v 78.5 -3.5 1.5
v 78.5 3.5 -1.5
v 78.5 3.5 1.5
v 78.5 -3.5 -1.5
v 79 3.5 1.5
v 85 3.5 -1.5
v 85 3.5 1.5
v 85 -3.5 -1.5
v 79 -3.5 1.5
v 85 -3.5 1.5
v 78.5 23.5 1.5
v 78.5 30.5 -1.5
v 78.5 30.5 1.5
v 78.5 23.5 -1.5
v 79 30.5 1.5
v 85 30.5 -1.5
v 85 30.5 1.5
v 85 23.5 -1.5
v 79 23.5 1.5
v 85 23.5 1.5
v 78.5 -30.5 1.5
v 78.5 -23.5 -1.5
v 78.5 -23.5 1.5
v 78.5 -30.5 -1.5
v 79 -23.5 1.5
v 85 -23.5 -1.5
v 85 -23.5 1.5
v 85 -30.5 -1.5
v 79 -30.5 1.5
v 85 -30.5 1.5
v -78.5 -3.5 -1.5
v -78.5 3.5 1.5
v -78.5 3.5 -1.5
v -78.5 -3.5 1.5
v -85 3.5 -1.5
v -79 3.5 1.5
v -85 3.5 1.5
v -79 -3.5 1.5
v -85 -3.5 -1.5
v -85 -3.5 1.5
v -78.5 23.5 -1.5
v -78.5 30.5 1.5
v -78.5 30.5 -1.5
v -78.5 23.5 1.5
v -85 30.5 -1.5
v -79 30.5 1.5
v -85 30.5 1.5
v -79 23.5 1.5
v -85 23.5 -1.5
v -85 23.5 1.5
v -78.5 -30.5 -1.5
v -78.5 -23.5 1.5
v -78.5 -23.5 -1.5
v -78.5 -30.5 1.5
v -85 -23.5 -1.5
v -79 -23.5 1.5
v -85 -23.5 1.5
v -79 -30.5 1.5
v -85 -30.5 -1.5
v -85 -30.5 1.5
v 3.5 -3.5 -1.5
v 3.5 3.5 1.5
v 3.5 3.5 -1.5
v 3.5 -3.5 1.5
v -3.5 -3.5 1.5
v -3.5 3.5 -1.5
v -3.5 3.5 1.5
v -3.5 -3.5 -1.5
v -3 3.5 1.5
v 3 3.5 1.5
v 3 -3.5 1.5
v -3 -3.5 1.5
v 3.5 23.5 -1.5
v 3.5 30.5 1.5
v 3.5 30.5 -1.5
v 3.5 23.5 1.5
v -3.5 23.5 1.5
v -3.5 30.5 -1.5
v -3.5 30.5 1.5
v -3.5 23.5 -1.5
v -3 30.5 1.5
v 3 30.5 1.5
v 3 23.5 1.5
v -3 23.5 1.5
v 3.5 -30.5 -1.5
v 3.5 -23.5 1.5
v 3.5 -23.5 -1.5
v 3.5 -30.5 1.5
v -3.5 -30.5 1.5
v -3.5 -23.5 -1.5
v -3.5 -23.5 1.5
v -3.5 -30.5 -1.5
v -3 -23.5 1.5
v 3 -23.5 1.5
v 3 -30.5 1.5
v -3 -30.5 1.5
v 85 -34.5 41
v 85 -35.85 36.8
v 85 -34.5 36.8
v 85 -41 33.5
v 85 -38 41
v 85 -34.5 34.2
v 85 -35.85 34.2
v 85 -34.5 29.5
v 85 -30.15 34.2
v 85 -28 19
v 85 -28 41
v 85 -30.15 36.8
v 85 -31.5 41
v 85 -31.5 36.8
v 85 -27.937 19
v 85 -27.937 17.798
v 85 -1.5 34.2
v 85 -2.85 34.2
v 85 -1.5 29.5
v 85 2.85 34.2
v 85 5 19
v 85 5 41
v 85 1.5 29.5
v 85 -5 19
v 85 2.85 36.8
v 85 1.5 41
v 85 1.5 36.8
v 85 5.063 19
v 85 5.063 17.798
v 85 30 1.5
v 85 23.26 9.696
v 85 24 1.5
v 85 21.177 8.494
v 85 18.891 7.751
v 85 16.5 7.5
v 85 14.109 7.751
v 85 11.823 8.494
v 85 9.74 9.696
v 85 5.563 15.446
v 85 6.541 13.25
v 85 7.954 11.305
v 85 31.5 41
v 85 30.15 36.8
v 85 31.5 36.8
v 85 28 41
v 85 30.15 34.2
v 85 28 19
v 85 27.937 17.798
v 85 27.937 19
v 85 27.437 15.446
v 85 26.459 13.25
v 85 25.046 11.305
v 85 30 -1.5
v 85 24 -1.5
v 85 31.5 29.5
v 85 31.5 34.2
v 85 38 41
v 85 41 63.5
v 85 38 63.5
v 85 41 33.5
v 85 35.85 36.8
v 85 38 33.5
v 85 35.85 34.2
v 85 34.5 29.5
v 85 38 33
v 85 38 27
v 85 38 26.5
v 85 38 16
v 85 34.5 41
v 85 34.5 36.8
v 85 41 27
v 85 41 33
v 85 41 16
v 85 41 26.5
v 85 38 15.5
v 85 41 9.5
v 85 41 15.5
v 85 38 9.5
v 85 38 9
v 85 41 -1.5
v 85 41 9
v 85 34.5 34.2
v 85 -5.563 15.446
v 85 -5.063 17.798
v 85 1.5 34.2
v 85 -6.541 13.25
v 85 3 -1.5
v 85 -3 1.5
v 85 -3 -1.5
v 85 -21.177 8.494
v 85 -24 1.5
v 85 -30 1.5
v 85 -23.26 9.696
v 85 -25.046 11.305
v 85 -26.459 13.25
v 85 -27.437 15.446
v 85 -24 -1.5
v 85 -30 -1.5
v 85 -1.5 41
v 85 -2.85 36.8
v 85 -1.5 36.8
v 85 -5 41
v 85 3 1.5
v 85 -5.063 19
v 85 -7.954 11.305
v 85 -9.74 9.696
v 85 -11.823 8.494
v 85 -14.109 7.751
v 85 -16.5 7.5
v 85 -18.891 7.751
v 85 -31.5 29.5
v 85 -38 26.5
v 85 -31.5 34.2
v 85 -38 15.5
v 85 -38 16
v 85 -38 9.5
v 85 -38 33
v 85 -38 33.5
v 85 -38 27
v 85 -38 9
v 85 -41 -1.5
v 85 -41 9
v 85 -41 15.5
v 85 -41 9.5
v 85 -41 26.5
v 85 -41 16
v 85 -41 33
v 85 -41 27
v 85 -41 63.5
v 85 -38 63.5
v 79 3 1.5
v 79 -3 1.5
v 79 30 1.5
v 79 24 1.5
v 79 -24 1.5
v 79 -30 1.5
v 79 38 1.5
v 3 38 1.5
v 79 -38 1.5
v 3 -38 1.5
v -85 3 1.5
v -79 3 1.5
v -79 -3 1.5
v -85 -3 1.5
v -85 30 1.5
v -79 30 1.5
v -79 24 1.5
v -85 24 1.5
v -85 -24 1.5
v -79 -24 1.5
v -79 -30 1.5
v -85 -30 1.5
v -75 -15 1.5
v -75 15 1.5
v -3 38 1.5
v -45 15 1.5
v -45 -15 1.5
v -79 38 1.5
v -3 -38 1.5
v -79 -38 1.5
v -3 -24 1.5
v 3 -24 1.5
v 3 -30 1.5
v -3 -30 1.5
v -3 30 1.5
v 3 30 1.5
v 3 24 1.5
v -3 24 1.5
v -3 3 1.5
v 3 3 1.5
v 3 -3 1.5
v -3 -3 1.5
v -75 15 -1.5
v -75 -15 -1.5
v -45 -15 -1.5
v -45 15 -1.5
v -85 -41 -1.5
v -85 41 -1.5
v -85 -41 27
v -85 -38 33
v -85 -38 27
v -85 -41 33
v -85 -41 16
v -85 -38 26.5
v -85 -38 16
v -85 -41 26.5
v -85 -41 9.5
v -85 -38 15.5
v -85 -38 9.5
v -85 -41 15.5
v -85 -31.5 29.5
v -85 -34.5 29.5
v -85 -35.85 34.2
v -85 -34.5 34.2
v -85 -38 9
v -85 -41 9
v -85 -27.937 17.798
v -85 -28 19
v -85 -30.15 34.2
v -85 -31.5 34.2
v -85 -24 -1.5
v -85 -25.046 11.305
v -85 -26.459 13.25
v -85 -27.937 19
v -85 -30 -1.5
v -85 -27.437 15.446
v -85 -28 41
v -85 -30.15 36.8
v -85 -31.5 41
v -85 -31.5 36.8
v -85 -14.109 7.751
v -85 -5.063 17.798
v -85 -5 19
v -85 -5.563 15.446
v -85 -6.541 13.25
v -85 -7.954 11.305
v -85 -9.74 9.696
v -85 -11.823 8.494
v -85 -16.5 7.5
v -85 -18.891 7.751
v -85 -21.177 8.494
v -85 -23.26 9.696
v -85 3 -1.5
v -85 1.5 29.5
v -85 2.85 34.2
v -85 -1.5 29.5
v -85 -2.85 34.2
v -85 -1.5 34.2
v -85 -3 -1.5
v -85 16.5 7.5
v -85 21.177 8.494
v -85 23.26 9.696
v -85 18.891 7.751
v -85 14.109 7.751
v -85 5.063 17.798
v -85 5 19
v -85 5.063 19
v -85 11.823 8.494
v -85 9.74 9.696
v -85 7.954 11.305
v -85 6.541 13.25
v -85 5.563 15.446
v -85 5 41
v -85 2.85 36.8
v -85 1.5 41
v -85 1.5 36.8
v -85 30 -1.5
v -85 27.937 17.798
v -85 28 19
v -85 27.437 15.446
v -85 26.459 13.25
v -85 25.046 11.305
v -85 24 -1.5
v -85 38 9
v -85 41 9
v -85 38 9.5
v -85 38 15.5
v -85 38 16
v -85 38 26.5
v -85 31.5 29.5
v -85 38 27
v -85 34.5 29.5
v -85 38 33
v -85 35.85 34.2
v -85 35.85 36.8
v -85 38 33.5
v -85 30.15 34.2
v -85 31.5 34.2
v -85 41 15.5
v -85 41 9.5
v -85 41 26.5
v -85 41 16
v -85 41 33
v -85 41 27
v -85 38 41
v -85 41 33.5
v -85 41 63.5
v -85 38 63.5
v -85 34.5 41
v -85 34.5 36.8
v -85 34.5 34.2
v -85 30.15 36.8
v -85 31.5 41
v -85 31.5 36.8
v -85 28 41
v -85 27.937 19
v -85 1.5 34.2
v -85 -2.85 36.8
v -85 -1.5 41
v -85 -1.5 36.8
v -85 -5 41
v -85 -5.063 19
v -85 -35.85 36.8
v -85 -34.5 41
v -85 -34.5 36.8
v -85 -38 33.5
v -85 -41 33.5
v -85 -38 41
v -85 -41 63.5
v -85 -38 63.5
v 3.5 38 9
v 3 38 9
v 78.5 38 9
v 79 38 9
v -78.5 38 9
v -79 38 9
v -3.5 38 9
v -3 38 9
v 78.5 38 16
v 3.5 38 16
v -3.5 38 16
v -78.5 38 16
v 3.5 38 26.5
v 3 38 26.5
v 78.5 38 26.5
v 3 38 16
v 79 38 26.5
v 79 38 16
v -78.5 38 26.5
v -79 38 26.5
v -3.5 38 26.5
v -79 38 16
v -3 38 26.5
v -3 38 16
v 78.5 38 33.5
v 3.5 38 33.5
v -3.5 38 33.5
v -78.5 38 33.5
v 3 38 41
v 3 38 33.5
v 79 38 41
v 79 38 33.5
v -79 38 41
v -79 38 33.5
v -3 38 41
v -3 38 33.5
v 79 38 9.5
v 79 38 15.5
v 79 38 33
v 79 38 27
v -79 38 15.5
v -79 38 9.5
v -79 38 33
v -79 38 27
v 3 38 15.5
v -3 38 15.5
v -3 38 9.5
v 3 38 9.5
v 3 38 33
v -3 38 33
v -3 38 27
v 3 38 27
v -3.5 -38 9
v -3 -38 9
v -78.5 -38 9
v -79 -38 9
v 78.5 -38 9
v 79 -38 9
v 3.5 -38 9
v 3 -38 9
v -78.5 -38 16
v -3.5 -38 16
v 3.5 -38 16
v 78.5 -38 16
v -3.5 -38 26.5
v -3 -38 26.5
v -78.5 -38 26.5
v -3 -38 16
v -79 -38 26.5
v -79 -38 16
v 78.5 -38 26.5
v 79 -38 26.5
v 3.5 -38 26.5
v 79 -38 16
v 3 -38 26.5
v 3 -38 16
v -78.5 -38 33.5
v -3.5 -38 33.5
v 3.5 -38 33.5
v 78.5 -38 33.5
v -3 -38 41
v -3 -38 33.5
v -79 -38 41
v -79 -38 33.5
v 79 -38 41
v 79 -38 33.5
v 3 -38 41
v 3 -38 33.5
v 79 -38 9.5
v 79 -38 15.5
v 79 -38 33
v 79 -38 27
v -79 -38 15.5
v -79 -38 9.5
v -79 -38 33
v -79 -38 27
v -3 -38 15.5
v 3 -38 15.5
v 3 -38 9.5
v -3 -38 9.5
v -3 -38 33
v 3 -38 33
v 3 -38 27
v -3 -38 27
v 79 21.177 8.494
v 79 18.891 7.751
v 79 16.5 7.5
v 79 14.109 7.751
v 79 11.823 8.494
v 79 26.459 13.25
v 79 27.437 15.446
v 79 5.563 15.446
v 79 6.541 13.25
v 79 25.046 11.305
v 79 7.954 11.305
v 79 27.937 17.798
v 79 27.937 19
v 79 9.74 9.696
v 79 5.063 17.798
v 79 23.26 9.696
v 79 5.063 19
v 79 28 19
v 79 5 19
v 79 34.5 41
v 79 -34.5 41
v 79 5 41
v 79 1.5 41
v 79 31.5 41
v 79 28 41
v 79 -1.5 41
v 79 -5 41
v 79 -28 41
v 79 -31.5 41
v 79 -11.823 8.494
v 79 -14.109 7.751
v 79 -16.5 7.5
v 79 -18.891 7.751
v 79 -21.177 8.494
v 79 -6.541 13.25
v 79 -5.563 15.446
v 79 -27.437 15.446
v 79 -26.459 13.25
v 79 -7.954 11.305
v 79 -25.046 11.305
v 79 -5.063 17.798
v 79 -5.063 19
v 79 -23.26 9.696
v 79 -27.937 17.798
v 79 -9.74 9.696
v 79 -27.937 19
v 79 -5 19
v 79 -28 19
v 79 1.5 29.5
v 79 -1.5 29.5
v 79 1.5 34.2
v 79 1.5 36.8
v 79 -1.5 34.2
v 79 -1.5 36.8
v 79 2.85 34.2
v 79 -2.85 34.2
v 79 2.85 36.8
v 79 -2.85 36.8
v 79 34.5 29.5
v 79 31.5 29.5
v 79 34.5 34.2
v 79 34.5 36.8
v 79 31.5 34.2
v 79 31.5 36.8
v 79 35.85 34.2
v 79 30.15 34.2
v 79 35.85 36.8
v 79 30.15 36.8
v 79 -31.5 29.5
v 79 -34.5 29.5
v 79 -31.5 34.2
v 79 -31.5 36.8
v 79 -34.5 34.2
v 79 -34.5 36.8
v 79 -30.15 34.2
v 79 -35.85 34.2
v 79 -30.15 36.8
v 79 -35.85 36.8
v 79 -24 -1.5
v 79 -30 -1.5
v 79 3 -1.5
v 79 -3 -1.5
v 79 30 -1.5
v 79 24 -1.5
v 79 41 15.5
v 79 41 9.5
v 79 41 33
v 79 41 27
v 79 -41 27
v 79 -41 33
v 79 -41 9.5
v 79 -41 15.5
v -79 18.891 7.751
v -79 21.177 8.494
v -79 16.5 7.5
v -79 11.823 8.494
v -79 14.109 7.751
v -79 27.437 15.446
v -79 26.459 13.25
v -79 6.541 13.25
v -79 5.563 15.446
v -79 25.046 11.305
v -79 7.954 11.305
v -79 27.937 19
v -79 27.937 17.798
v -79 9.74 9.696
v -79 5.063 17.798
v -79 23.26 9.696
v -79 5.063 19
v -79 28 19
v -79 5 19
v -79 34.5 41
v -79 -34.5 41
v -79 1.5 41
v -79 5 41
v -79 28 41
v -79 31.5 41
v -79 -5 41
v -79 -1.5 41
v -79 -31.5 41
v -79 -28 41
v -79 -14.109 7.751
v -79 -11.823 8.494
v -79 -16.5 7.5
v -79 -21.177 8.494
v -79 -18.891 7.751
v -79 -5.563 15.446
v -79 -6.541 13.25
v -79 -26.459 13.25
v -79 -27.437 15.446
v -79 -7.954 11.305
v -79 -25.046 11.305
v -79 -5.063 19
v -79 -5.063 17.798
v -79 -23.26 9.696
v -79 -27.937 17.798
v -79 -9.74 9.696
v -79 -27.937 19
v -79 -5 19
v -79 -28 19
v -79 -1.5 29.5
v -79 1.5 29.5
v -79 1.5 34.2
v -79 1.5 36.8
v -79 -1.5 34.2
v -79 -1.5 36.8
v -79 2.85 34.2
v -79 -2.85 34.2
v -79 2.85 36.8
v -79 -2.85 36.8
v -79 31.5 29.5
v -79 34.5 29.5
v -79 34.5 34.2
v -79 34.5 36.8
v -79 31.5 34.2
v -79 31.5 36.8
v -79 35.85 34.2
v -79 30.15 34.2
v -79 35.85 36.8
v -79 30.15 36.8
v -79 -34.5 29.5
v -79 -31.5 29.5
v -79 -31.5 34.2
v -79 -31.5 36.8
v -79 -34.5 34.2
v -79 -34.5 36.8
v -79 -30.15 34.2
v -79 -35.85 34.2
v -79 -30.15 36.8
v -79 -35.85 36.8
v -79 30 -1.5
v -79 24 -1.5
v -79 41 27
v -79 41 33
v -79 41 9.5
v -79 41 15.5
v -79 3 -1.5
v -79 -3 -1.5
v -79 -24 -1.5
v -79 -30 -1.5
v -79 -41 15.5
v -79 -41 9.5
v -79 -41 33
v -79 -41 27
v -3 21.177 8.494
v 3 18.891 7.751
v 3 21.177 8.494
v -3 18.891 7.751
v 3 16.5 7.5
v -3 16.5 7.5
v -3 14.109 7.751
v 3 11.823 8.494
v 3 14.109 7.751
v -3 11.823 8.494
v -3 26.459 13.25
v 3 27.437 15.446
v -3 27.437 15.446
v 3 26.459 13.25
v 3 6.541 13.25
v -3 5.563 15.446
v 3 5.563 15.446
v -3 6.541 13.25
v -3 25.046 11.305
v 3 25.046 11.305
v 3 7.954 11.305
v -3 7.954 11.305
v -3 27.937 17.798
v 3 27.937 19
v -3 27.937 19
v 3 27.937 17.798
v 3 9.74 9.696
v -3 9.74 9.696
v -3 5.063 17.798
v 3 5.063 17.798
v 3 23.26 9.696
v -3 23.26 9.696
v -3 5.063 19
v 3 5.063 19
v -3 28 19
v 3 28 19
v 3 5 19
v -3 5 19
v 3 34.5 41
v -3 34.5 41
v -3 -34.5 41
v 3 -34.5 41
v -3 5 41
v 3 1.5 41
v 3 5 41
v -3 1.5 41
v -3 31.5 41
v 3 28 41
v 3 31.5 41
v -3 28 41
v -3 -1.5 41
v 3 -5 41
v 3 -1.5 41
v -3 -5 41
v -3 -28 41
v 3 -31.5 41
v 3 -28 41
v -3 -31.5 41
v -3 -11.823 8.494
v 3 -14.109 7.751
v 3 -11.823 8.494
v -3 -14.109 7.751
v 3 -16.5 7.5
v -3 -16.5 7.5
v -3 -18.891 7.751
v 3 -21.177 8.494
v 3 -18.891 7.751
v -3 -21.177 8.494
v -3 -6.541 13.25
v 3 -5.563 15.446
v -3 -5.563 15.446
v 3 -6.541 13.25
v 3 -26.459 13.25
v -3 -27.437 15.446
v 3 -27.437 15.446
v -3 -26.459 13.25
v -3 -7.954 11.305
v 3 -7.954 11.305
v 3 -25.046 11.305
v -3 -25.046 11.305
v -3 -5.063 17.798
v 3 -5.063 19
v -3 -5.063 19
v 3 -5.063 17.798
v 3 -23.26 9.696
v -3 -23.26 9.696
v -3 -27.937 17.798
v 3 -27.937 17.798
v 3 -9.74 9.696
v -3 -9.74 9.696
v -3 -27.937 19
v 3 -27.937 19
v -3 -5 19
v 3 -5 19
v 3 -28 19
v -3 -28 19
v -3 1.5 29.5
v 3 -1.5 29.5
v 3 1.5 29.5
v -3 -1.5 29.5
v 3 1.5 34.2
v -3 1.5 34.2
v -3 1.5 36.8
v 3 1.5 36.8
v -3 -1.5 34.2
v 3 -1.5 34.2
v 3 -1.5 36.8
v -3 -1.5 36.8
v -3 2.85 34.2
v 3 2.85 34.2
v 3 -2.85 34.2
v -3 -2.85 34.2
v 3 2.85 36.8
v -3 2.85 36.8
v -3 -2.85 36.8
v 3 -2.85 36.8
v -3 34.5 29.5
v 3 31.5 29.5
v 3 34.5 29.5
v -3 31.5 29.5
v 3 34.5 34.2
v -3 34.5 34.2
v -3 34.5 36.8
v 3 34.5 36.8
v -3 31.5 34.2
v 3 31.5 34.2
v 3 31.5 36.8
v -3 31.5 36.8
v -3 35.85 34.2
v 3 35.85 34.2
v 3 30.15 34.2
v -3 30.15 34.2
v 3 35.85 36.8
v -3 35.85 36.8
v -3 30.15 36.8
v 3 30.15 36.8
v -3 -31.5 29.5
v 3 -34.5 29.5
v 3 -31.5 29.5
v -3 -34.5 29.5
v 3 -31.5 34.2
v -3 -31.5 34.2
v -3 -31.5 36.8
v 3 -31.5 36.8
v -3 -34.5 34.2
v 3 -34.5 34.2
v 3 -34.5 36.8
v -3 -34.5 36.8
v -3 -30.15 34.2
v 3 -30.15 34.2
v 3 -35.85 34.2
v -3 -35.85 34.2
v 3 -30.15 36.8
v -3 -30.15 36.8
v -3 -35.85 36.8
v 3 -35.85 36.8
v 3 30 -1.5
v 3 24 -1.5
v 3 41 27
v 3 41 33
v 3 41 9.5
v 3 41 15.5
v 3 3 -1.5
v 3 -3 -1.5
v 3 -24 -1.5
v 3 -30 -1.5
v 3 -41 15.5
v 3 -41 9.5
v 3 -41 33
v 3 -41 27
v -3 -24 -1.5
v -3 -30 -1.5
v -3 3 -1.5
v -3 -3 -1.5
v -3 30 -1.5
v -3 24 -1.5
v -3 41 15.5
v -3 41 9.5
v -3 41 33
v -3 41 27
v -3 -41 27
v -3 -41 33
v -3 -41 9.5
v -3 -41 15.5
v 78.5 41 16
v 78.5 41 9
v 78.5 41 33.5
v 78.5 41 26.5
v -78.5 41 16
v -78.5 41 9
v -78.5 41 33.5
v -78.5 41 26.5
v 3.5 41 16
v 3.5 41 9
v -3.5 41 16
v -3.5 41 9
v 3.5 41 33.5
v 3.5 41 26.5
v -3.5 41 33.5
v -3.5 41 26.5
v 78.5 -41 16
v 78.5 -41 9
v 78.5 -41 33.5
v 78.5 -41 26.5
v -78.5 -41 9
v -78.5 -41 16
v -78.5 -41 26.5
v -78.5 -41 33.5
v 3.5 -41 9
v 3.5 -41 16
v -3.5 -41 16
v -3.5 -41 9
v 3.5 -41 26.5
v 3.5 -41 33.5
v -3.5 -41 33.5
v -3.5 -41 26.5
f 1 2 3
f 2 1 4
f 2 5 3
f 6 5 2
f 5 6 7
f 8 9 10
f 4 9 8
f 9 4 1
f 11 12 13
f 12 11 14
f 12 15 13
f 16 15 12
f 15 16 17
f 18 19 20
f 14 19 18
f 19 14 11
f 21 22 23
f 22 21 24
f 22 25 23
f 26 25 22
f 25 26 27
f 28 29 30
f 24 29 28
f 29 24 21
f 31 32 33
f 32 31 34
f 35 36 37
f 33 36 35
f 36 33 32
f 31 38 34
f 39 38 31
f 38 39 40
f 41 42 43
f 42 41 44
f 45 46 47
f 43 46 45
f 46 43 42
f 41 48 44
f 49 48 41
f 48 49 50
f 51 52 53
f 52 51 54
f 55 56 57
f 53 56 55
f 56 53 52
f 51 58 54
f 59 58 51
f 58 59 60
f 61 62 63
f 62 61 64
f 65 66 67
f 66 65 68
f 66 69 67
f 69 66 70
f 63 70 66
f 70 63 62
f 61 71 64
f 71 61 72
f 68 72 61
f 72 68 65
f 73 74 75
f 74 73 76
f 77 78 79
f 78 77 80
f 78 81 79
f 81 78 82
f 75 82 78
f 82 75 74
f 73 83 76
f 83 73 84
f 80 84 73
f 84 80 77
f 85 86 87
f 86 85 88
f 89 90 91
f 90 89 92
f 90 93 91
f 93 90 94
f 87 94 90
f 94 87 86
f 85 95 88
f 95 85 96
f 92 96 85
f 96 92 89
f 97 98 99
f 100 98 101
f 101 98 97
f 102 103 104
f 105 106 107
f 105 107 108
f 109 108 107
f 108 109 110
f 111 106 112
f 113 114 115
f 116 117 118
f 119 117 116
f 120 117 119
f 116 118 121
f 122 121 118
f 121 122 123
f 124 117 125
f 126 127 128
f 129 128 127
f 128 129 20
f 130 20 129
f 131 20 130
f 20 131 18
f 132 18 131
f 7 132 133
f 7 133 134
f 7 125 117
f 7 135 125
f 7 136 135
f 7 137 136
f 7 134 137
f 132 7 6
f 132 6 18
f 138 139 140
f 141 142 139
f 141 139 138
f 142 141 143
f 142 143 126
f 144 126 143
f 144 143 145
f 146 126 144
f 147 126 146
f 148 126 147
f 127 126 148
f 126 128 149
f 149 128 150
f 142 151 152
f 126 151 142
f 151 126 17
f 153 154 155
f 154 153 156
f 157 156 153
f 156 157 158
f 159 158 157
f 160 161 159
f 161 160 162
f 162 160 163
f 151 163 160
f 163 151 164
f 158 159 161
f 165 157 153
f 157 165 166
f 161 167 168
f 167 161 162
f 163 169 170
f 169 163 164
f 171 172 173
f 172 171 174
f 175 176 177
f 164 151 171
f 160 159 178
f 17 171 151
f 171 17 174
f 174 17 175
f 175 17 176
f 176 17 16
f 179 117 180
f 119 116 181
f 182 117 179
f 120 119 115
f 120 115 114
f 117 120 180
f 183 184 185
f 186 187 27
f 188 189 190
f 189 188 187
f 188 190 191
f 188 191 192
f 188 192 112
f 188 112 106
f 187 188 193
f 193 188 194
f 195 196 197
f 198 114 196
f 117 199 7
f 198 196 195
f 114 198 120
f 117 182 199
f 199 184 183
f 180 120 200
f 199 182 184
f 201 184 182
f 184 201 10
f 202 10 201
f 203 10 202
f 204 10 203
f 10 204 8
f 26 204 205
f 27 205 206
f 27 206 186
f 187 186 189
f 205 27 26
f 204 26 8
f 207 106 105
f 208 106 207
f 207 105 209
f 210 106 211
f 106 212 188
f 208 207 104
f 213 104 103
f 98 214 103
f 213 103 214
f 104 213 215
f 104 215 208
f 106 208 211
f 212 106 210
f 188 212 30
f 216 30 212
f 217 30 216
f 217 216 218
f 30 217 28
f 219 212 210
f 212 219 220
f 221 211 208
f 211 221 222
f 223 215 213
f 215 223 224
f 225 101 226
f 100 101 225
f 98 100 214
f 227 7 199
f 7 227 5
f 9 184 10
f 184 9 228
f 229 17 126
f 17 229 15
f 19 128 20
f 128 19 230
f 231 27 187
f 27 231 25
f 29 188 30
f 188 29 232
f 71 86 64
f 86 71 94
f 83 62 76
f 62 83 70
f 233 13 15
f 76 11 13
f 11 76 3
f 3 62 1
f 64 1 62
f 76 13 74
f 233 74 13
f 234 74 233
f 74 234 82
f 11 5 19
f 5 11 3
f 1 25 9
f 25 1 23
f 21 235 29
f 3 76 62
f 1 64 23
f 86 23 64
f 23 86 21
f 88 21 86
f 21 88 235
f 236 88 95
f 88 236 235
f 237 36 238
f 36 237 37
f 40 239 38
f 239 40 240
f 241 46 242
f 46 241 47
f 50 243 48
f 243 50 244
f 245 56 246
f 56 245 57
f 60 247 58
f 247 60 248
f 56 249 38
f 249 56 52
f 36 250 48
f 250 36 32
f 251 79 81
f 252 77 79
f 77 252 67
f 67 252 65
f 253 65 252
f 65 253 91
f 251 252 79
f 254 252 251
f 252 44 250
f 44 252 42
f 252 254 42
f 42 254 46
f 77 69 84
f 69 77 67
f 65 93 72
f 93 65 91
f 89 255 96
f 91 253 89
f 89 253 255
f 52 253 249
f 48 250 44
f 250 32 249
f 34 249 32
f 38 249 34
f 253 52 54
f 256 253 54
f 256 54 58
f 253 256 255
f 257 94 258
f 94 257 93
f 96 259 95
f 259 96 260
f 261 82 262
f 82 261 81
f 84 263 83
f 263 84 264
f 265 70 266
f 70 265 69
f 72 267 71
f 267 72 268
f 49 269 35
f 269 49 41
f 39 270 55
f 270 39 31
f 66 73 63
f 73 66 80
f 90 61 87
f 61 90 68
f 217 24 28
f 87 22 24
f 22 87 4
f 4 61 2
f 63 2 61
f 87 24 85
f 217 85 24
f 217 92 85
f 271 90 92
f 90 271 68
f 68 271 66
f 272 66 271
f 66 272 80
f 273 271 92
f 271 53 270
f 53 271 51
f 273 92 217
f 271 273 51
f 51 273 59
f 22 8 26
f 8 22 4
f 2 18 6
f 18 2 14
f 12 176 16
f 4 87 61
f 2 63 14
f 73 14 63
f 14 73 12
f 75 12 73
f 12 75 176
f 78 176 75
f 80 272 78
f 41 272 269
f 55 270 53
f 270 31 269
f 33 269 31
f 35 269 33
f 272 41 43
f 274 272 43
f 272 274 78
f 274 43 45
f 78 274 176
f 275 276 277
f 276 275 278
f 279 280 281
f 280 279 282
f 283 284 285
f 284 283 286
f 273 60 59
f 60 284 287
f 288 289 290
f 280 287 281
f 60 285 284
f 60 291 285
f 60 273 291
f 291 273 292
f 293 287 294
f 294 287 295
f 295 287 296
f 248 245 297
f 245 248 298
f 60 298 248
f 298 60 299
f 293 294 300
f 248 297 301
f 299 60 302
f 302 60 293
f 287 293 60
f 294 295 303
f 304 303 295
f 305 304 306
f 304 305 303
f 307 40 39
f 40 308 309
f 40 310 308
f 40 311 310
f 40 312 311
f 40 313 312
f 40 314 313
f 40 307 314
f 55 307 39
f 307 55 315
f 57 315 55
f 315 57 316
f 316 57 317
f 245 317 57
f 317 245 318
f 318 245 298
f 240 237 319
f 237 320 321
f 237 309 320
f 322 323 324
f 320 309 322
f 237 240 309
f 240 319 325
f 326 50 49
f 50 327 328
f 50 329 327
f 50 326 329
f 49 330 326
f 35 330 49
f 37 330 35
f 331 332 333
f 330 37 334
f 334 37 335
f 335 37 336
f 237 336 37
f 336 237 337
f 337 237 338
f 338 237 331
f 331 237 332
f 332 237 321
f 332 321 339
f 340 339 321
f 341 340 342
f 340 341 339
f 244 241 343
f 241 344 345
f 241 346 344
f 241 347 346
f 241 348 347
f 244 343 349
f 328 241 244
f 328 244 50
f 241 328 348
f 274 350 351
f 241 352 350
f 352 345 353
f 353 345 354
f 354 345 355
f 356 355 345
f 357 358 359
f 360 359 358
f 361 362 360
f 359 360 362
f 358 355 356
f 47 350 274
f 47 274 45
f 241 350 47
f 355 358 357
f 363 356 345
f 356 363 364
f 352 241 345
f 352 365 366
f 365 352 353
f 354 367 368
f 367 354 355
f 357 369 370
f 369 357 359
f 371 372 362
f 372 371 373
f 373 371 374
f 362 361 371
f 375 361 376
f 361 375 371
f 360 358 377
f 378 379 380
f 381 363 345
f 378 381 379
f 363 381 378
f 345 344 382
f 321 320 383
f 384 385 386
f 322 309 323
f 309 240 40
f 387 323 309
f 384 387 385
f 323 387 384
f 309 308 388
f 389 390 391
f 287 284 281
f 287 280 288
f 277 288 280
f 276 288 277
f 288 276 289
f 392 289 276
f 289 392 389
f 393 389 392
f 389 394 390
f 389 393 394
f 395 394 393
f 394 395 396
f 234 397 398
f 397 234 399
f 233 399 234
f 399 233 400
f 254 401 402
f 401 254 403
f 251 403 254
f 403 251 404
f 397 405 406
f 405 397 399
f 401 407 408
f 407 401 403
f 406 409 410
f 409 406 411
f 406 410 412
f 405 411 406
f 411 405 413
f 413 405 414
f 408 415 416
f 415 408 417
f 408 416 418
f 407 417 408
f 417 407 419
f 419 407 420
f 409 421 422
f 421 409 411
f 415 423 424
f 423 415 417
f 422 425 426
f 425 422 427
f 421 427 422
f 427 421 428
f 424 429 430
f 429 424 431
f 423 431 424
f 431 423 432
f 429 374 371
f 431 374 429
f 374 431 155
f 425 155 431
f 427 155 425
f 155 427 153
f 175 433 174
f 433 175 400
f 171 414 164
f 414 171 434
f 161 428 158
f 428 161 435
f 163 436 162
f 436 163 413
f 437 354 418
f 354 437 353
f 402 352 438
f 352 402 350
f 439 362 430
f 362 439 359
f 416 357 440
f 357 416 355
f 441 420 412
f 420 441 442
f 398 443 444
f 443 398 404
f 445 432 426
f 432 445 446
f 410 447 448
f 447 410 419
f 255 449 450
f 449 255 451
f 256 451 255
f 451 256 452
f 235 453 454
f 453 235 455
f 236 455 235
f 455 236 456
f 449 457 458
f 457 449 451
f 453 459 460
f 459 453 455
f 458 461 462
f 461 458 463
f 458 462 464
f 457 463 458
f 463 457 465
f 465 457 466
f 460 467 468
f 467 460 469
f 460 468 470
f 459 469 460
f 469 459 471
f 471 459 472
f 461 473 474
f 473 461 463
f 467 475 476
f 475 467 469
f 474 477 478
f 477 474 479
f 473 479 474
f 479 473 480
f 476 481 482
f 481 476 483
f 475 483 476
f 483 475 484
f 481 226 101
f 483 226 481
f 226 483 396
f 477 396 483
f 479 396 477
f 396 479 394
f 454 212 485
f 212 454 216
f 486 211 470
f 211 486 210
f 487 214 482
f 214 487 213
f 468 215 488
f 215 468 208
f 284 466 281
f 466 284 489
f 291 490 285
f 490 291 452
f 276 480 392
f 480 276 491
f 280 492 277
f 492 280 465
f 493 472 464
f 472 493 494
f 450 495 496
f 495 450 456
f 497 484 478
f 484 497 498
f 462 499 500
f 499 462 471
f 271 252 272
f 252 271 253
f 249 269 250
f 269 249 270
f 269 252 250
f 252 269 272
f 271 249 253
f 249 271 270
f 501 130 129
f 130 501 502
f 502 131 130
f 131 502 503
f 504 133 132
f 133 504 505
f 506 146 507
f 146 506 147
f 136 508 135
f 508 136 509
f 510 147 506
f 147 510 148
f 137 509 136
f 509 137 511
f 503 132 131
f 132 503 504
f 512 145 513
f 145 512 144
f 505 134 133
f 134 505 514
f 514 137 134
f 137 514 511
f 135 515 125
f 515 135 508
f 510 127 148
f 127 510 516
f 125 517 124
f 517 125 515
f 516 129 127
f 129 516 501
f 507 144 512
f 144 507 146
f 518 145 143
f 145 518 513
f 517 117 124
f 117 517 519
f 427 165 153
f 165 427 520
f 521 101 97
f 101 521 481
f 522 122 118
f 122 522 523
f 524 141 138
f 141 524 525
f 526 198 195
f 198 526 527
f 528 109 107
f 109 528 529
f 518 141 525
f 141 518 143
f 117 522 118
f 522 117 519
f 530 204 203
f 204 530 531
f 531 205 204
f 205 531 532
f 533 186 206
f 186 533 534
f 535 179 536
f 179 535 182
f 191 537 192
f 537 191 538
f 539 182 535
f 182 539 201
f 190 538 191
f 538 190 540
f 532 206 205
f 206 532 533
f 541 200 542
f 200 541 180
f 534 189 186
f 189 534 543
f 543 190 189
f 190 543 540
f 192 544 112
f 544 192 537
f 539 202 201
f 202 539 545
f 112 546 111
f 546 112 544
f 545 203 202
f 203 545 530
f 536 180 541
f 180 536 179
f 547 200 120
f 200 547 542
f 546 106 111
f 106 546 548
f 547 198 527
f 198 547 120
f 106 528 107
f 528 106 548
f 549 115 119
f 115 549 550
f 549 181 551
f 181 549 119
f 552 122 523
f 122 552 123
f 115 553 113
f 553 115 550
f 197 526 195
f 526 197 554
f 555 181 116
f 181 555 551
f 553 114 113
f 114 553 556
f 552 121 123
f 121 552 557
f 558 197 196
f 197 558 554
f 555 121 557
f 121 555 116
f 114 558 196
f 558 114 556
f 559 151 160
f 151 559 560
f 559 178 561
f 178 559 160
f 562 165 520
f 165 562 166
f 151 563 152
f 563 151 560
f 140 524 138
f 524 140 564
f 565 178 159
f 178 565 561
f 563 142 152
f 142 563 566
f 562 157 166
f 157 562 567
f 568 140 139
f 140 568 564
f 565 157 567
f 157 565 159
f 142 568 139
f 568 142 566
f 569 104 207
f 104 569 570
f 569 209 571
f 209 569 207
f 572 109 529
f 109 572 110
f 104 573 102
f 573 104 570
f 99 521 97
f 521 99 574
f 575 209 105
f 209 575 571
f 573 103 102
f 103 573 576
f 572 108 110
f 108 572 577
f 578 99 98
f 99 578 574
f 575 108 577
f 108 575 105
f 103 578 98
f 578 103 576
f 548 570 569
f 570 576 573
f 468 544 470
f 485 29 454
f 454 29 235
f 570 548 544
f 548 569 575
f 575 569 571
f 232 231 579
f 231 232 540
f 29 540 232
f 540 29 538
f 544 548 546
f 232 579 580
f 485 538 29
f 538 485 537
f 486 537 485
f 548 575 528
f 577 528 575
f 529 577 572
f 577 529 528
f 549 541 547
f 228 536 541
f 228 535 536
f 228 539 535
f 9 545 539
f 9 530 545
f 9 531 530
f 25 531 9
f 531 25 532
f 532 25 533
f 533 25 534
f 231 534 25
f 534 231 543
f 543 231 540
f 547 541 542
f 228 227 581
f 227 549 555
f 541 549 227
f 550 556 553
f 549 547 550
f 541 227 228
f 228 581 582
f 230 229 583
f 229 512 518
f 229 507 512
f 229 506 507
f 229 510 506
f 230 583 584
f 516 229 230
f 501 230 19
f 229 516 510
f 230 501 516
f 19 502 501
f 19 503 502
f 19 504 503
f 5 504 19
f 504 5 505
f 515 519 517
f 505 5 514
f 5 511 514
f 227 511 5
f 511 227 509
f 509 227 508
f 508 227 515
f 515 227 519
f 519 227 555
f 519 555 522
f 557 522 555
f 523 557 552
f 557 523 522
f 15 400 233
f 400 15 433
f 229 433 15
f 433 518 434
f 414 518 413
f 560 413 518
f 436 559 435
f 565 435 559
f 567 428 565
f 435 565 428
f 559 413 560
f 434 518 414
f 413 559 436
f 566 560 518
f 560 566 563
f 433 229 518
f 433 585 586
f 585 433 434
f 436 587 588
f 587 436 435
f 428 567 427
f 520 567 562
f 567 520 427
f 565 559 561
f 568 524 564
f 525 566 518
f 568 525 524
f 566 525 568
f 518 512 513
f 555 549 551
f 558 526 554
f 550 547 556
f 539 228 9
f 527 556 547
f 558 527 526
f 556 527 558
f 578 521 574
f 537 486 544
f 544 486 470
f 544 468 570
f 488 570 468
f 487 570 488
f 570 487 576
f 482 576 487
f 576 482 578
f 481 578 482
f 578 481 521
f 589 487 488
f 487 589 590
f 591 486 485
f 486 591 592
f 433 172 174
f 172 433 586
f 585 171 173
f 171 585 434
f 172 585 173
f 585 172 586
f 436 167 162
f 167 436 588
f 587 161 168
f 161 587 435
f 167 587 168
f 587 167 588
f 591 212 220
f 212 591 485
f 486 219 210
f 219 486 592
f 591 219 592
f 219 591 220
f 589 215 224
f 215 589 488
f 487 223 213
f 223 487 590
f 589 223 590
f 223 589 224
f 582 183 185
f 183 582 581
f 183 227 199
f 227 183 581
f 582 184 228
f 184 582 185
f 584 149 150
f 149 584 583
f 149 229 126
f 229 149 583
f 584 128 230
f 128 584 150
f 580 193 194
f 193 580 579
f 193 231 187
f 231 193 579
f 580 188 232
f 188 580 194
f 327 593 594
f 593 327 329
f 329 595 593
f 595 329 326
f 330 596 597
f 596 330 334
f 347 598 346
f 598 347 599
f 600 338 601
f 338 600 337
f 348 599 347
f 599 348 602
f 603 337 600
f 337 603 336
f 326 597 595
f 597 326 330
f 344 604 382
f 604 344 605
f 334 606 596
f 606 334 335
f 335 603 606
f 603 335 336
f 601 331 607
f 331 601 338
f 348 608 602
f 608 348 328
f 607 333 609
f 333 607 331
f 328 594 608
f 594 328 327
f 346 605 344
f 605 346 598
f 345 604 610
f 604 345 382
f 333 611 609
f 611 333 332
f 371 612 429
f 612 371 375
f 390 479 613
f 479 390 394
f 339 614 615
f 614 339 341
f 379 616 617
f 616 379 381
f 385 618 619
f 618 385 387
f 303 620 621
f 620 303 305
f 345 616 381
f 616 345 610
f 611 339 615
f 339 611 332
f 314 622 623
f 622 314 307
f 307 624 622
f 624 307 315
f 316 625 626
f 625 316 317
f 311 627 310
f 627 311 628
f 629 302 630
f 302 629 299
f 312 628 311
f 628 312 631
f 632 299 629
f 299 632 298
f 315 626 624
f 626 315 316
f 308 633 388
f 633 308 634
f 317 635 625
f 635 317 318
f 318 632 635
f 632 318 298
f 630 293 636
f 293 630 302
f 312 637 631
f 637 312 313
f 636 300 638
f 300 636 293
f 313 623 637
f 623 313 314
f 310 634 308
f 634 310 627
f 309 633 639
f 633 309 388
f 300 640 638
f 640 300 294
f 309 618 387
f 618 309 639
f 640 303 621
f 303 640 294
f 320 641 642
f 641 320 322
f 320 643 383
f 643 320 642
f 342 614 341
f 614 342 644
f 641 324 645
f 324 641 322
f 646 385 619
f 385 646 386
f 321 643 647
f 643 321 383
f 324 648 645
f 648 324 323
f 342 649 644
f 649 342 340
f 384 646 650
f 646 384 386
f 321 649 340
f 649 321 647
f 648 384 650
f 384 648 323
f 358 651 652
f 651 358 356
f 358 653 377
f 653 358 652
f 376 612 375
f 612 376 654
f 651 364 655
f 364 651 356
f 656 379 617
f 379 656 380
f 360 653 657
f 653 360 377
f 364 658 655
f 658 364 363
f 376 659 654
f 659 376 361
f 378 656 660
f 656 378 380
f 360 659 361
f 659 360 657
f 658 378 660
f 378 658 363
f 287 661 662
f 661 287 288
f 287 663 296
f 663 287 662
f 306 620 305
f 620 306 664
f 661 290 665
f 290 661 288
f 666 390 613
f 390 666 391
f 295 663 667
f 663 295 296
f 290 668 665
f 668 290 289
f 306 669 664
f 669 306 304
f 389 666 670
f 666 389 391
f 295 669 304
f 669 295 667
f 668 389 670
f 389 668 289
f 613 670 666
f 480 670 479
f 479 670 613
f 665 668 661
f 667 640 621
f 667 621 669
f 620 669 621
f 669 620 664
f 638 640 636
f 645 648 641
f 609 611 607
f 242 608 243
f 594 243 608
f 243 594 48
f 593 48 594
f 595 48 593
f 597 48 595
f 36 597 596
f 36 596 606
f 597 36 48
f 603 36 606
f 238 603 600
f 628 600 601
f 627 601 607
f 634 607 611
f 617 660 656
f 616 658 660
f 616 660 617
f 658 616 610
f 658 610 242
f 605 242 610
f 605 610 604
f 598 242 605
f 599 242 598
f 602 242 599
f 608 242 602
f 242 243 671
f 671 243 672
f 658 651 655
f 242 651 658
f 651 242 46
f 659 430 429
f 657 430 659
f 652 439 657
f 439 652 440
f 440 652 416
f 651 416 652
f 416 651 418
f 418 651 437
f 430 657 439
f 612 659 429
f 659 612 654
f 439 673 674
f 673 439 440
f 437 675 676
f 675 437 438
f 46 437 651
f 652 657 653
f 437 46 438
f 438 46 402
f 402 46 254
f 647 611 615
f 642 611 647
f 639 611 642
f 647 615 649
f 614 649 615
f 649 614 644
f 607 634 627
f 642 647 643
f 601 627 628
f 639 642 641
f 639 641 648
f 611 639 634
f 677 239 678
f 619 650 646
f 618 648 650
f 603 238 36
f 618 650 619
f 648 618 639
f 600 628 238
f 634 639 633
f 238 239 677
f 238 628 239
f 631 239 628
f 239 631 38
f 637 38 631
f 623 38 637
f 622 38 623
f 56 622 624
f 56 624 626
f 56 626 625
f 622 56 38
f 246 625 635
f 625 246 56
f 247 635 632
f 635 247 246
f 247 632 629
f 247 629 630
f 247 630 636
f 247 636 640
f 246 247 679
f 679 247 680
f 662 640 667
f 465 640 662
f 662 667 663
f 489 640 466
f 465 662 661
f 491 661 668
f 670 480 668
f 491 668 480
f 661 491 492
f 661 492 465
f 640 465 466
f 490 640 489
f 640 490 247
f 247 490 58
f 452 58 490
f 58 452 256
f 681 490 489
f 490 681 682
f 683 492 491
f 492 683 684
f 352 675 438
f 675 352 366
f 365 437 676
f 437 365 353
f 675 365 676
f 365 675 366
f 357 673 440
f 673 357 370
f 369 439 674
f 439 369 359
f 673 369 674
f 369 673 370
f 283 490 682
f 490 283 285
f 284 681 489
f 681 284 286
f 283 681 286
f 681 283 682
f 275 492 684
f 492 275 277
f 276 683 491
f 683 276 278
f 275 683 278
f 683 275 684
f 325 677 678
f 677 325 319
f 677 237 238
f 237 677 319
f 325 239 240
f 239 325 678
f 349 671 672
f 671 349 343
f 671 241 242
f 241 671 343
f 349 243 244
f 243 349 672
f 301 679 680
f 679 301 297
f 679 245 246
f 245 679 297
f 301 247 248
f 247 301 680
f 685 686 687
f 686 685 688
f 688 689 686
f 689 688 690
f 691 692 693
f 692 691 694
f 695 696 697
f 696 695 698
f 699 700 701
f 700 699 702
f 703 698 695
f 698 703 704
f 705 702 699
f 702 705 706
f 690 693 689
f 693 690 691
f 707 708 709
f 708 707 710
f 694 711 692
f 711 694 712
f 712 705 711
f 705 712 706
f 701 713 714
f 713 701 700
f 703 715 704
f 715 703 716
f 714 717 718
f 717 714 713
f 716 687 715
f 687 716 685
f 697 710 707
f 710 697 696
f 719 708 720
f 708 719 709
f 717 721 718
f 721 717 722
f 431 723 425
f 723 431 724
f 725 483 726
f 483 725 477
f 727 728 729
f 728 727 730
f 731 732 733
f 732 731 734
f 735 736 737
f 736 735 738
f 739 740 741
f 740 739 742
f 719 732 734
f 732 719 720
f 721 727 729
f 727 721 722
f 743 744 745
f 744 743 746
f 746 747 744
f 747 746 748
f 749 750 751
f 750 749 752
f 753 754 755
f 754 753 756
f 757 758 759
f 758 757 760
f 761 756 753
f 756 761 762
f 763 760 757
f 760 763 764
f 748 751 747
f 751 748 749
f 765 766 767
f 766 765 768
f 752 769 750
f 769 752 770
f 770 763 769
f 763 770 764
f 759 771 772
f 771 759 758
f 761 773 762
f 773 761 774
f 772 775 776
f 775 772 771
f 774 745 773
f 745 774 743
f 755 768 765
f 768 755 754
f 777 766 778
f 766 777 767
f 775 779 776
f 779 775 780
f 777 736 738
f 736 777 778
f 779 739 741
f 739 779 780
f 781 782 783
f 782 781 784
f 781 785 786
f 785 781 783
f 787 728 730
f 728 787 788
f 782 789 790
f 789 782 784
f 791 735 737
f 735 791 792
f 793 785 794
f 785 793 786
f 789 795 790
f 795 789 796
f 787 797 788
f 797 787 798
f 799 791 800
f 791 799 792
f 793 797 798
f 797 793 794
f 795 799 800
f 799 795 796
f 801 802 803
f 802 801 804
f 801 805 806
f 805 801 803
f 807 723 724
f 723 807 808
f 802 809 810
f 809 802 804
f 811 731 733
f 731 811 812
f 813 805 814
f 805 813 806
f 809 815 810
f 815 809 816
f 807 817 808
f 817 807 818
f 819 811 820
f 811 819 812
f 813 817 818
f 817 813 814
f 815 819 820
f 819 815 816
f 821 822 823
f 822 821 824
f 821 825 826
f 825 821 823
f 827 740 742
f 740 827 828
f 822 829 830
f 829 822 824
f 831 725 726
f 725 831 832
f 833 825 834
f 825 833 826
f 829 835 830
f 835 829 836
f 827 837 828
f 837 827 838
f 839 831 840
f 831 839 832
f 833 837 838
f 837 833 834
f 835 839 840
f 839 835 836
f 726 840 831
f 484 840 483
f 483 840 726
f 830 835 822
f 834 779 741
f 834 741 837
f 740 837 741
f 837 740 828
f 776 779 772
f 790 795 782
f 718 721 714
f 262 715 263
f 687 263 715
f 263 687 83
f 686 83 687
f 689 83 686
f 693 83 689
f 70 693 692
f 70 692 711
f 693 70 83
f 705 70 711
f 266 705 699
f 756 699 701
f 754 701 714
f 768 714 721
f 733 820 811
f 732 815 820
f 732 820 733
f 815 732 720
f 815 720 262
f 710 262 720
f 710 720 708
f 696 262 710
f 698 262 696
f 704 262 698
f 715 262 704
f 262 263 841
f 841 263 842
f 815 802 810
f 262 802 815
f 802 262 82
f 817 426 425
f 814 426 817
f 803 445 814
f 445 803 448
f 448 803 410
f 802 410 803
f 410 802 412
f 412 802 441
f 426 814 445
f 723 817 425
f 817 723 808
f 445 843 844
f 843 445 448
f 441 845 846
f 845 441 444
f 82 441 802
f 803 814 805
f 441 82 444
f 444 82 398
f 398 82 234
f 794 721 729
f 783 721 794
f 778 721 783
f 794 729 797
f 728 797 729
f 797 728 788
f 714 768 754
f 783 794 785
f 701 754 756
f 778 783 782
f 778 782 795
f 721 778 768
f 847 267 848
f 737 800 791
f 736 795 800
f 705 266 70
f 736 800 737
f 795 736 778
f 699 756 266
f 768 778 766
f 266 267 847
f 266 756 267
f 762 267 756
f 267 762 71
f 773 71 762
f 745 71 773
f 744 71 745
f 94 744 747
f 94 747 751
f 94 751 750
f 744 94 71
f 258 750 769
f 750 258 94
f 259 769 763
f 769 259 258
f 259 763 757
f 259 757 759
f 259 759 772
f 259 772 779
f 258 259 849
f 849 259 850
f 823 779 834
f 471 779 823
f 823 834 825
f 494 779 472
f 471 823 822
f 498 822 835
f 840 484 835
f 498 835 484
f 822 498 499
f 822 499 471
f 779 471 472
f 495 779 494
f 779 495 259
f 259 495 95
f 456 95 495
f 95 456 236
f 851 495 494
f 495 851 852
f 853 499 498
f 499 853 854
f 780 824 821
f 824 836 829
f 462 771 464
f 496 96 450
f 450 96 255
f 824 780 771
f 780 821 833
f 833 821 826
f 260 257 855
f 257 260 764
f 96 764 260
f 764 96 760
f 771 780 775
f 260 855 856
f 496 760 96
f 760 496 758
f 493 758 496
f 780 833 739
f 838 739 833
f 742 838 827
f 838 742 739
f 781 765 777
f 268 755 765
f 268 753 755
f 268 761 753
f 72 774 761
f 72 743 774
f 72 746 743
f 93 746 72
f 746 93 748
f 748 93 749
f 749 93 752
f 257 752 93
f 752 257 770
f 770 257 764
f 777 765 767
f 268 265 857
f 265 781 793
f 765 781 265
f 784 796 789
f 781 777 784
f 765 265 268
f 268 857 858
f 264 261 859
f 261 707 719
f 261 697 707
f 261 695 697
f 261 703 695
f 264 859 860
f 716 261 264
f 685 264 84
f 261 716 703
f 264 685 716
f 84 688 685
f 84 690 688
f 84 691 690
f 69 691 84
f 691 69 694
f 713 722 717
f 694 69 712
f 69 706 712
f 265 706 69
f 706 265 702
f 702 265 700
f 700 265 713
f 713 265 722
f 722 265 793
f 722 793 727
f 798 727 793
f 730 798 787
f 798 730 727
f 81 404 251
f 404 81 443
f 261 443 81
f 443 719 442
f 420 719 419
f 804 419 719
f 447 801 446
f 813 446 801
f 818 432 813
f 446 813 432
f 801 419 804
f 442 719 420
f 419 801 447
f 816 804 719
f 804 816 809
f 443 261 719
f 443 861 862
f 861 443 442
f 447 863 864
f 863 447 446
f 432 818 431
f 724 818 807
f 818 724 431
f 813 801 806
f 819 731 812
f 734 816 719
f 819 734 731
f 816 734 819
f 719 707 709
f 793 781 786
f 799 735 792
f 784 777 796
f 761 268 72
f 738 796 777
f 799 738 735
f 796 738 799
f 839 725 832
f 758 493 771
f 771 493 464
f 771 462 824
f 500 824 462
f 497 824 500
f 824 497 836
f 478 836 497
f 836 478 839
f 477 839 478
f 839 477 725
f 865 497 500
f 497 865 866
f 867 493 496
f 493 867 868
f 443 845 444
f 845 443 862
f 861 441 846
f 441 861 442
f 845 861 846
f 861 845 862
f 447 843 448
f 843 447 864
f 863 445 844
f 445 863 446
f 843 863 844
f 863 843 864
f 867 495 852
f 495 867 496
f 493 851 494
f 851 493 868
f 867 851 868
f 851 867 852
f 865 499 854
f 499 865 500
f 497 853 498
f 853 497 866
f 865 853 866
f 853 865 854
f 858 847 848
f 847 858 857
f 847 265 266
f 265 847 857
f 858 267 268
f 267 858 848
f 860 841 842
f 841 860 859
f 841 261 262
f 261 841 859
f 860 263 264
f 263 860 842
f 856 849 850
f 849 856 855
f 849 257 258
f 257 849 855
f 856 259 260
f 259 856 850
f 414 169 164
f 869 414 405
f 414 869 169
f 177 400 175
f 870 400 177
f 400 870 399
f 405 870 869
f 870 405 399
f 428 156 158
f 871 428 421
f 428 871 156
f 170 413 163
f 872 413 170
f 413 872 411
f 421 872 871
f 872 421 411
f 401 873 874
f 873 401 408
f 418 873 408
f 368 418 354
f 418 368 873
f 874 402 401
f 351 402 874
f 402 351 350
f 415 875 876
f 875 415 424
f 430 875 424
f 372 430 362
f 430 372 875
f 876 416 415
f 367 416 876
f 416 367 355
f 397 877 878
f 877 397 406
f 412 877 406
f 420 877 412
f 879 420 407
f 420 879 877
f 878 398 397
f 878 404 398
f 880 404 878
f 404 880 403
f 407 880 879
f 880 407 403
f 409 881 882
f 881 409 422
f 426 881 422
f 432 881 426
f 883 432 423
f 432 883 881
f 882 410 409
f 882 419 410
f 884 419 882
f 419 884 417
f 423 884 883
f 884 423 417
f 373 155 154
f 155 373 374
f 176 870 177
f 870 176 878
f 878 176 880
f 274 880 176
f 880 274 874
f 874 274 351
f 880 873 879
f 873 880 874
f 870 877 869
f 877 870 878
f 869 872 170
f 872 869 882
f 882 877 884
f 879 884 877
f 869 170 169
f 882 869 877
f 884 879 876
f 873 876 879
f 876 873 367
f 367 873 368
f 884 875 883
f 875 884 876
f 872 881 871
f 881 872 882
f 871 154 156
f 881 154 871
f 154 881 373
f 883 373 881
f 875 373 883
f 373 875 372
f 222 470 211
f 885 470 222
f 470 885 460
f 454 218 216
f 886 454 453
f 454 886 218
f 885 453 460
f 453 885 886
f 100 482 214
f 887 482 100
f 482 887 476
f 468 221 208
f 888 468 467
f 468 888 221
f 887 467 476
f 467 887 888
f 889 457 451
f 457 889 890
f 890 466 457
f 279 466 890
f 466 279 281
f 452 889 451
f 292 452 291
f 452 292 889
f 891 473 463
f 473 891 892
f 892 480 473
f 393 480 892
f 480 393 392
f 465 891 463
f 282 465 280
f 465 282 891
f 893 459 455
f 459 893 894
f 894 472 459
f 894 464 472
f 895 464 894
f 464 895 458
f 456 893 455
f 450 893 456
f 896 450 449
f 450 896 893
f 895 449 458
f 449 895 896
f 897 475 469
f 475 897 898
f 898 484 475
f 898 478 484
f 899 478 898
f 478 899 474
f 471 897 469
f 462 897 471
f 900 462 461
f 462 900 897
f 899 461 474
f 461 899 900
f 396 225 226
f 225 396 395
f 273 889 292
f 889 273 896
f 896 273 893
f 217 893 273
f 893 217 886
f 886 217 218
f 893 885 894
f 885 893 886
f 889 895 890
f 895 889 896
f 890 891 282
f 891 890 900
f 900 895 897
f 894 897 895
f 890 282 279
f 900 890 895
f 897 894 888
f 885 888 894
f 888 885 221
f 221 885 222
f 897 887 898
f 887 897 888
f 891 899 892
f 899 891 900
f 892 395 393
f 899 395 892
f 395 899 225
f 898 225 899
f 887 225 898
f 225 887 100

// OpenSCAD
// file: battery.scad
module battery (h,w,l) {
	union () {
		translate([h/2-w/2,0]) {
			cylinder(h=l,d1=w,d2=w,center=true);
		}
		translate([-(h/2-w/2),0]) {
			cylinder(h=l,d1=w,d2=w,center=true);

		}
		cube([h-w,w,l],center=true);
	}
}
// file: ../utils/screw_slot.scad
module screw_slot(dScrew, lScrew, wPlate,lSlot,wNut,lNut) {
	shiftScrew=lScrew/2-wPlate/2;
	shiftNut=lScrew/2;
	union() {
		cube([wPlate+1,lSlot+1,wPlate+1], center=true);
		translate([shiftScrew,0,0]) {
			cube([lScrew,dScrew,wPlate+1],center=true);
		}
		translate([shiftNut,0,0]) {
			cube([wNut,lNut,wPlate+1],center=true);
		}
	}
}

//screw_slot(3,18,6,10,2.4,5.5);
// file: batLateral.scad
module internalSupportHole(distBottom,distTopSlot,woodWidth) {
	translate([0,0,-(distBottom-6-8)]) {
		cube([7,woodWidth+2,7],center=true);
	}
	translate([0,0,(distTopSlot-8)]) {
		cube([7,woodWidth+2,7],center=true);
	}
}

module batLateral(hBat,wBat,lBat) {
	$woodWidth=3;

	$spaceForConnectors=40;
	$spaceForFixation=20;
	$battFromBottom=6;

	$lPlate=lBat+$spaceForConnectors;
	$hPlate=hBat+$spaceForFixation;

	$distBottom=$hPlate/2;
	$distTopSlot=-$distBottom+$battFromBottom+hBat-wBat/2;

	difference() {
		cube([$lPlate,$woodWidth,$hPlate],center=true);
		translate([$lPlate/2-3,0,0]) {
			internalSupportHole($distBottom,$distTopSlot,$woodWidth);
		}
		translate([-($lPlate/2-3),0,0]) {
			internalSupportHole($distBottom,$distTopSlot,$woodWidth);
		}
//		translate([$lPlate/2-lBat+19,0,0]) {
		translate([0,0,0]) {
			internalSupportHole($distBottom,$distTopSlot,$woodWidth);
		}
	}
}
// file: batBottom.scad
module internalSupportHoleBottom(distSide, woodWidth) {
	cube([7,7,$woodWidth+2],center=true);
	translate([0,distSide-3-8,0]) {
		cube([7,7,woodWidth+2],center=true);
	}
	translate([0,-(distSide-3-8),0]) {
		cube([7,7,woodWidth+2],center=true);
	}
}

module batBottom (hBat,wBat,lBat) {
	$spaceBetweenBatteries=10;
	$spaceForConnectors=40;

	$wPlate=wBat*2+3*$spaceBetweenBatteries;
	$lPlate=lBat+$spaceForConnectors;

	$distSide=wBat+1.5*$spaceBetweenBatteries;

	$woodWidth=3;

	difference() {
		cube([$lPlate,$wPlate,$woodWidth],center=true);
		translate([$lPlate/2-3,0,0]) {
			internalSupportHoleBottom($distSide,$woodWidth);
		}
		translate([-($lPlate/2-3),0,0]) {
			internalSupportHoleBottom($distSide,$woodWidth);
		}
//		translate([$lPlate/2-lBat+19,0,0]) {
		translate([0,0,0]) {
			internalSupportHoleBottom($distSide,$woodWidth);
		}
		translate([-($lPlate/2-15-10),0,0]) {
			// TODO Au Pif!
			cube([30,30,$woodWidth+2],true);
		}
	}
}

//batBottom(45,23,130);
// file: batSupport.scad
include <../utils/screw_slot.scad>
include <battery.scad>

module batSupport(hBat,wBat) {
	$battFromBottom=6;
	$spaceBetweenBatteries=10;

	$distBottom=$battFromBottom+hBat/2;
	$distTop=-(hBat/2-wBat/2);
	$distSide=wBat+1.5*$spaceBetweenBatteries;

	$woodWidth=6;

	$dScrew=3;
	$lScrew=18;
	$wNut=2.6;
	$lNut=5.7;

	// Add the mounting brackets to the main plate
	union() {
		// Substracts the two battery slots and the screw slots from the main plate
		difference() {
			// The main plate
			translate([wBat/4+($battFromBottom/2),0,0]) {
				cube([hBat-wBat/2+$battFromBottom,wBat*2+3*$spaceBetweenBatteries,$woodWidth],center=true);
			}
			// Slot for battery 1
			translate([0,wBat/2+$spaceBetweenBatteries/2,0]) {
				battery(hBat,wBat,$woodWidth+2);
			}
			// Slot for battery 2
			translate([0,-(wBat/2+$spaceBetweenBatteries/2),0]) {
				battery(hBat,wBat,$woodWidth+2);
			}
			// 3 screw slots
			translate([-($woodWidth/2+0.5+hBat/2-wBat/2),0,0]) {
				// Central screw slot
				screw_slot($dScrew,$lScrew,$woodWidth,$spaceBetweenBatteries,$wNut,$lNut);
				// A lateral screw slot
				translate([0,wBat+$spaceBetweenBatteries,0]) {
					screw_slot($dScrew,$lScrew,$woodWidth,$spaceBetweenBatteries,$wNut,$lNut);
				}
				// An other lateral screw slot
				translate([0,-(wBat+$spaceBetweenBatteries),0]) {
					screw_slot($dScrew,$lScrew,$woodWidth,$spaceBetweenBatteries,$wNut,$lNut);
				}
			}
		}
		// Lateral/Bottom mounting bracket
		translate([$distBottom-3-8,wBat+1.5*$spaceBetweenBatteries+1.5,0]) {
			cube([6,3,$woodWidth],center=true);
		}
		// Lateral/Top mounting bracket
		translate([$distTop+3+8,wBat+1.5*$spaceBetweenBatteries+1.5,0]) {
			cube([6,3,$woodWidth],center=true);
		}
		// Lateral/Bottom mounting bracket
		translate([$distBottom-3-8,-(wBat+1.5*$spaceBetweenBatteries+1.5),0]) {
			cube([6,3,$woodWidth],center=true);
		}
		// Lateral/Top mounting bracket
		translate([$distTop+3+8,-(wBat+1.5*$spaceBetweenBatteries+1.5),0]) {
			cube([6,3,$woodWidth],center=true);
		}
		// Bottom/Center mounting bracket
		translate([$distBottom+1.5,0,0]) {
			cube([3,6,$woodWidth],center=true);
		}
		// A Bottom/Lateral mounting bracket
		translate([$distBottom+1.5,$distSide-3-8,0]) {
			cube([3,6,$woodWidth],center=true);
		}
		// The other Bottom/Lateral mounting bracket
		translate([$distBottom+1.5,-($distSide-3-8),0]) {
			cube([3,6,$woodWidth],center=true);
		}
	}
}

//projection(cut=false) {
//	batSupport(45,23);
//}
// main file
include <batSupport.scad>
include <batBottom.scad>
include <batLateral.scad>

$hBat=45;
$wBat=23;
$lBat=130;

$battFromBottom=6;
$spaceForConnectors=40;
$spaceForFixation=20;
$spaceBetweenBatteries=10;

$distBottom=$battFromBottom+$hBat/2;
$distSide=$wBat+1.5*$spaceBetweenBatteries;
$lPlate=$lBat+$spaceForConnectors;
$hPlate=$hBat+$spaceForFixation;

batBottom($hBat,$wBat,$lBat);

translate([$lPlate/2-3,0,$distBottom+1.5]) {
	color([1,0,0])
	rotate([0,90,0]) {
		batSupport($hBat,$wBat);
	}
}

translate([-($lPlate/2-3),0,$distBottom+1.5]) {
	color([1,0,0])
	rotate([0,90,0]) {
		batSupport($hBat,$wBat);
	}
}

//translate([$lPlate/2-$lBat+19,0,$distBottom+1.5]) {
translate([0,0,$distBottom+1.5]) {
	color([1,0,0])
	rotate([0,90,0]) {
		batSupport($hBat,$wBat);
	}
}

translate([0,$distSide+1.5,$hPlate/2-1.5]) {
	color([0,1,0])
	batLateral($hBat,$wBat,$lBat);
}

translate([0,-($distSide+1.5),$hPlate/2-1.5]) {
	color([0,1,0])
	batLateral($hBat,$wBat,$lBat);
}
